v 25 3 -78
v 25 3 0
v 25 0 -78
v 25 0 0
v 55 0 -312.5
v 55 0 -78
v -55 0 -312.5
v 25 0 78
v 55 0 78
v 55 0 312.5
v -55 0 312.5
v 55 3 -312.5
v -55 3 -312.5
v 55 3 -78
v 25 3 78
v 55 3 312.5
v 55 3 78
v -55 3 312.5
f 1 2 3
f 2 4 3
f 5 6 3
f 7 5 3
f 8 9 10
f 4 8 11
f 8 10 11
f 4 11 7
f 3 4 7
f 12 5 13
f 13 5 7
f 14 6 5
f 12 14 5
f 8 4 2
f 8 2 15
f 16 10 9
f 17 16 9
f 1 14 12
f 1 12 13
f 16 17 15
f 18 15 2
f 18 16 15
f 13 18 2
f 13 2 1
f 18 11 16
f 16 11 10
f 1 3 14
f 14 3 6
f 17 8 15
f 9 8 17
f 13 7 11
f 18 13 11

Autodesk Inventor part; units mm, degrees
ref_plane "YZ Plane" through (0, 0, 0) normal (1, 0, 0) x (0, 1, 0)
ref_plane "XZ Plane" through (0, 0, 0) normal (0, 1, 0) x (-1, 0, 0)
ref_plane "XY Plane" through (0, 0, 0) normal (0, 0, 1) x (1, 0, 0)
sketch "Sketch1" plane through (0, 0, 0) normal (0, 1, 0) x (-1, 0, 0)
  line L0 (55, 312.5) -> (-55, 312.5)
  line L1 (-55, 312.5) -> (-55, -312.5)
  line L2 (-55, -312.5) -> (55, -312.5)
  line L3 (55, -312.5) -> (55, 312.5)
  line L4 (55, 312.5) -> (-55, -312.5) construction
  line L5 (-55, 312.5) -> (55, -312.5) construction
  line L6 (0, 0) -> (-55, 0)
  line L7 (-55, 0) -> (-25, 0)
  line L8 (-25, 0) -> (-25, -78)
  line L9 (-25, -78) -> (-25, 78)
  line L10 (-25, 78) -> (-55, 78)
  line L11 (-25, -78) -> (-55, -78)
  dimension "d0" = 110
  dimension "d1" = 625
  dimension "d2" = 30
  dimension "d3" = 78
  dimension "d4" = 156
extrude "Extrusion1" add sketch "Sketch1" along normal blind 3 contours L3 L2 L1 L11 L8 L9 L10 L0
properties part number "border2"
